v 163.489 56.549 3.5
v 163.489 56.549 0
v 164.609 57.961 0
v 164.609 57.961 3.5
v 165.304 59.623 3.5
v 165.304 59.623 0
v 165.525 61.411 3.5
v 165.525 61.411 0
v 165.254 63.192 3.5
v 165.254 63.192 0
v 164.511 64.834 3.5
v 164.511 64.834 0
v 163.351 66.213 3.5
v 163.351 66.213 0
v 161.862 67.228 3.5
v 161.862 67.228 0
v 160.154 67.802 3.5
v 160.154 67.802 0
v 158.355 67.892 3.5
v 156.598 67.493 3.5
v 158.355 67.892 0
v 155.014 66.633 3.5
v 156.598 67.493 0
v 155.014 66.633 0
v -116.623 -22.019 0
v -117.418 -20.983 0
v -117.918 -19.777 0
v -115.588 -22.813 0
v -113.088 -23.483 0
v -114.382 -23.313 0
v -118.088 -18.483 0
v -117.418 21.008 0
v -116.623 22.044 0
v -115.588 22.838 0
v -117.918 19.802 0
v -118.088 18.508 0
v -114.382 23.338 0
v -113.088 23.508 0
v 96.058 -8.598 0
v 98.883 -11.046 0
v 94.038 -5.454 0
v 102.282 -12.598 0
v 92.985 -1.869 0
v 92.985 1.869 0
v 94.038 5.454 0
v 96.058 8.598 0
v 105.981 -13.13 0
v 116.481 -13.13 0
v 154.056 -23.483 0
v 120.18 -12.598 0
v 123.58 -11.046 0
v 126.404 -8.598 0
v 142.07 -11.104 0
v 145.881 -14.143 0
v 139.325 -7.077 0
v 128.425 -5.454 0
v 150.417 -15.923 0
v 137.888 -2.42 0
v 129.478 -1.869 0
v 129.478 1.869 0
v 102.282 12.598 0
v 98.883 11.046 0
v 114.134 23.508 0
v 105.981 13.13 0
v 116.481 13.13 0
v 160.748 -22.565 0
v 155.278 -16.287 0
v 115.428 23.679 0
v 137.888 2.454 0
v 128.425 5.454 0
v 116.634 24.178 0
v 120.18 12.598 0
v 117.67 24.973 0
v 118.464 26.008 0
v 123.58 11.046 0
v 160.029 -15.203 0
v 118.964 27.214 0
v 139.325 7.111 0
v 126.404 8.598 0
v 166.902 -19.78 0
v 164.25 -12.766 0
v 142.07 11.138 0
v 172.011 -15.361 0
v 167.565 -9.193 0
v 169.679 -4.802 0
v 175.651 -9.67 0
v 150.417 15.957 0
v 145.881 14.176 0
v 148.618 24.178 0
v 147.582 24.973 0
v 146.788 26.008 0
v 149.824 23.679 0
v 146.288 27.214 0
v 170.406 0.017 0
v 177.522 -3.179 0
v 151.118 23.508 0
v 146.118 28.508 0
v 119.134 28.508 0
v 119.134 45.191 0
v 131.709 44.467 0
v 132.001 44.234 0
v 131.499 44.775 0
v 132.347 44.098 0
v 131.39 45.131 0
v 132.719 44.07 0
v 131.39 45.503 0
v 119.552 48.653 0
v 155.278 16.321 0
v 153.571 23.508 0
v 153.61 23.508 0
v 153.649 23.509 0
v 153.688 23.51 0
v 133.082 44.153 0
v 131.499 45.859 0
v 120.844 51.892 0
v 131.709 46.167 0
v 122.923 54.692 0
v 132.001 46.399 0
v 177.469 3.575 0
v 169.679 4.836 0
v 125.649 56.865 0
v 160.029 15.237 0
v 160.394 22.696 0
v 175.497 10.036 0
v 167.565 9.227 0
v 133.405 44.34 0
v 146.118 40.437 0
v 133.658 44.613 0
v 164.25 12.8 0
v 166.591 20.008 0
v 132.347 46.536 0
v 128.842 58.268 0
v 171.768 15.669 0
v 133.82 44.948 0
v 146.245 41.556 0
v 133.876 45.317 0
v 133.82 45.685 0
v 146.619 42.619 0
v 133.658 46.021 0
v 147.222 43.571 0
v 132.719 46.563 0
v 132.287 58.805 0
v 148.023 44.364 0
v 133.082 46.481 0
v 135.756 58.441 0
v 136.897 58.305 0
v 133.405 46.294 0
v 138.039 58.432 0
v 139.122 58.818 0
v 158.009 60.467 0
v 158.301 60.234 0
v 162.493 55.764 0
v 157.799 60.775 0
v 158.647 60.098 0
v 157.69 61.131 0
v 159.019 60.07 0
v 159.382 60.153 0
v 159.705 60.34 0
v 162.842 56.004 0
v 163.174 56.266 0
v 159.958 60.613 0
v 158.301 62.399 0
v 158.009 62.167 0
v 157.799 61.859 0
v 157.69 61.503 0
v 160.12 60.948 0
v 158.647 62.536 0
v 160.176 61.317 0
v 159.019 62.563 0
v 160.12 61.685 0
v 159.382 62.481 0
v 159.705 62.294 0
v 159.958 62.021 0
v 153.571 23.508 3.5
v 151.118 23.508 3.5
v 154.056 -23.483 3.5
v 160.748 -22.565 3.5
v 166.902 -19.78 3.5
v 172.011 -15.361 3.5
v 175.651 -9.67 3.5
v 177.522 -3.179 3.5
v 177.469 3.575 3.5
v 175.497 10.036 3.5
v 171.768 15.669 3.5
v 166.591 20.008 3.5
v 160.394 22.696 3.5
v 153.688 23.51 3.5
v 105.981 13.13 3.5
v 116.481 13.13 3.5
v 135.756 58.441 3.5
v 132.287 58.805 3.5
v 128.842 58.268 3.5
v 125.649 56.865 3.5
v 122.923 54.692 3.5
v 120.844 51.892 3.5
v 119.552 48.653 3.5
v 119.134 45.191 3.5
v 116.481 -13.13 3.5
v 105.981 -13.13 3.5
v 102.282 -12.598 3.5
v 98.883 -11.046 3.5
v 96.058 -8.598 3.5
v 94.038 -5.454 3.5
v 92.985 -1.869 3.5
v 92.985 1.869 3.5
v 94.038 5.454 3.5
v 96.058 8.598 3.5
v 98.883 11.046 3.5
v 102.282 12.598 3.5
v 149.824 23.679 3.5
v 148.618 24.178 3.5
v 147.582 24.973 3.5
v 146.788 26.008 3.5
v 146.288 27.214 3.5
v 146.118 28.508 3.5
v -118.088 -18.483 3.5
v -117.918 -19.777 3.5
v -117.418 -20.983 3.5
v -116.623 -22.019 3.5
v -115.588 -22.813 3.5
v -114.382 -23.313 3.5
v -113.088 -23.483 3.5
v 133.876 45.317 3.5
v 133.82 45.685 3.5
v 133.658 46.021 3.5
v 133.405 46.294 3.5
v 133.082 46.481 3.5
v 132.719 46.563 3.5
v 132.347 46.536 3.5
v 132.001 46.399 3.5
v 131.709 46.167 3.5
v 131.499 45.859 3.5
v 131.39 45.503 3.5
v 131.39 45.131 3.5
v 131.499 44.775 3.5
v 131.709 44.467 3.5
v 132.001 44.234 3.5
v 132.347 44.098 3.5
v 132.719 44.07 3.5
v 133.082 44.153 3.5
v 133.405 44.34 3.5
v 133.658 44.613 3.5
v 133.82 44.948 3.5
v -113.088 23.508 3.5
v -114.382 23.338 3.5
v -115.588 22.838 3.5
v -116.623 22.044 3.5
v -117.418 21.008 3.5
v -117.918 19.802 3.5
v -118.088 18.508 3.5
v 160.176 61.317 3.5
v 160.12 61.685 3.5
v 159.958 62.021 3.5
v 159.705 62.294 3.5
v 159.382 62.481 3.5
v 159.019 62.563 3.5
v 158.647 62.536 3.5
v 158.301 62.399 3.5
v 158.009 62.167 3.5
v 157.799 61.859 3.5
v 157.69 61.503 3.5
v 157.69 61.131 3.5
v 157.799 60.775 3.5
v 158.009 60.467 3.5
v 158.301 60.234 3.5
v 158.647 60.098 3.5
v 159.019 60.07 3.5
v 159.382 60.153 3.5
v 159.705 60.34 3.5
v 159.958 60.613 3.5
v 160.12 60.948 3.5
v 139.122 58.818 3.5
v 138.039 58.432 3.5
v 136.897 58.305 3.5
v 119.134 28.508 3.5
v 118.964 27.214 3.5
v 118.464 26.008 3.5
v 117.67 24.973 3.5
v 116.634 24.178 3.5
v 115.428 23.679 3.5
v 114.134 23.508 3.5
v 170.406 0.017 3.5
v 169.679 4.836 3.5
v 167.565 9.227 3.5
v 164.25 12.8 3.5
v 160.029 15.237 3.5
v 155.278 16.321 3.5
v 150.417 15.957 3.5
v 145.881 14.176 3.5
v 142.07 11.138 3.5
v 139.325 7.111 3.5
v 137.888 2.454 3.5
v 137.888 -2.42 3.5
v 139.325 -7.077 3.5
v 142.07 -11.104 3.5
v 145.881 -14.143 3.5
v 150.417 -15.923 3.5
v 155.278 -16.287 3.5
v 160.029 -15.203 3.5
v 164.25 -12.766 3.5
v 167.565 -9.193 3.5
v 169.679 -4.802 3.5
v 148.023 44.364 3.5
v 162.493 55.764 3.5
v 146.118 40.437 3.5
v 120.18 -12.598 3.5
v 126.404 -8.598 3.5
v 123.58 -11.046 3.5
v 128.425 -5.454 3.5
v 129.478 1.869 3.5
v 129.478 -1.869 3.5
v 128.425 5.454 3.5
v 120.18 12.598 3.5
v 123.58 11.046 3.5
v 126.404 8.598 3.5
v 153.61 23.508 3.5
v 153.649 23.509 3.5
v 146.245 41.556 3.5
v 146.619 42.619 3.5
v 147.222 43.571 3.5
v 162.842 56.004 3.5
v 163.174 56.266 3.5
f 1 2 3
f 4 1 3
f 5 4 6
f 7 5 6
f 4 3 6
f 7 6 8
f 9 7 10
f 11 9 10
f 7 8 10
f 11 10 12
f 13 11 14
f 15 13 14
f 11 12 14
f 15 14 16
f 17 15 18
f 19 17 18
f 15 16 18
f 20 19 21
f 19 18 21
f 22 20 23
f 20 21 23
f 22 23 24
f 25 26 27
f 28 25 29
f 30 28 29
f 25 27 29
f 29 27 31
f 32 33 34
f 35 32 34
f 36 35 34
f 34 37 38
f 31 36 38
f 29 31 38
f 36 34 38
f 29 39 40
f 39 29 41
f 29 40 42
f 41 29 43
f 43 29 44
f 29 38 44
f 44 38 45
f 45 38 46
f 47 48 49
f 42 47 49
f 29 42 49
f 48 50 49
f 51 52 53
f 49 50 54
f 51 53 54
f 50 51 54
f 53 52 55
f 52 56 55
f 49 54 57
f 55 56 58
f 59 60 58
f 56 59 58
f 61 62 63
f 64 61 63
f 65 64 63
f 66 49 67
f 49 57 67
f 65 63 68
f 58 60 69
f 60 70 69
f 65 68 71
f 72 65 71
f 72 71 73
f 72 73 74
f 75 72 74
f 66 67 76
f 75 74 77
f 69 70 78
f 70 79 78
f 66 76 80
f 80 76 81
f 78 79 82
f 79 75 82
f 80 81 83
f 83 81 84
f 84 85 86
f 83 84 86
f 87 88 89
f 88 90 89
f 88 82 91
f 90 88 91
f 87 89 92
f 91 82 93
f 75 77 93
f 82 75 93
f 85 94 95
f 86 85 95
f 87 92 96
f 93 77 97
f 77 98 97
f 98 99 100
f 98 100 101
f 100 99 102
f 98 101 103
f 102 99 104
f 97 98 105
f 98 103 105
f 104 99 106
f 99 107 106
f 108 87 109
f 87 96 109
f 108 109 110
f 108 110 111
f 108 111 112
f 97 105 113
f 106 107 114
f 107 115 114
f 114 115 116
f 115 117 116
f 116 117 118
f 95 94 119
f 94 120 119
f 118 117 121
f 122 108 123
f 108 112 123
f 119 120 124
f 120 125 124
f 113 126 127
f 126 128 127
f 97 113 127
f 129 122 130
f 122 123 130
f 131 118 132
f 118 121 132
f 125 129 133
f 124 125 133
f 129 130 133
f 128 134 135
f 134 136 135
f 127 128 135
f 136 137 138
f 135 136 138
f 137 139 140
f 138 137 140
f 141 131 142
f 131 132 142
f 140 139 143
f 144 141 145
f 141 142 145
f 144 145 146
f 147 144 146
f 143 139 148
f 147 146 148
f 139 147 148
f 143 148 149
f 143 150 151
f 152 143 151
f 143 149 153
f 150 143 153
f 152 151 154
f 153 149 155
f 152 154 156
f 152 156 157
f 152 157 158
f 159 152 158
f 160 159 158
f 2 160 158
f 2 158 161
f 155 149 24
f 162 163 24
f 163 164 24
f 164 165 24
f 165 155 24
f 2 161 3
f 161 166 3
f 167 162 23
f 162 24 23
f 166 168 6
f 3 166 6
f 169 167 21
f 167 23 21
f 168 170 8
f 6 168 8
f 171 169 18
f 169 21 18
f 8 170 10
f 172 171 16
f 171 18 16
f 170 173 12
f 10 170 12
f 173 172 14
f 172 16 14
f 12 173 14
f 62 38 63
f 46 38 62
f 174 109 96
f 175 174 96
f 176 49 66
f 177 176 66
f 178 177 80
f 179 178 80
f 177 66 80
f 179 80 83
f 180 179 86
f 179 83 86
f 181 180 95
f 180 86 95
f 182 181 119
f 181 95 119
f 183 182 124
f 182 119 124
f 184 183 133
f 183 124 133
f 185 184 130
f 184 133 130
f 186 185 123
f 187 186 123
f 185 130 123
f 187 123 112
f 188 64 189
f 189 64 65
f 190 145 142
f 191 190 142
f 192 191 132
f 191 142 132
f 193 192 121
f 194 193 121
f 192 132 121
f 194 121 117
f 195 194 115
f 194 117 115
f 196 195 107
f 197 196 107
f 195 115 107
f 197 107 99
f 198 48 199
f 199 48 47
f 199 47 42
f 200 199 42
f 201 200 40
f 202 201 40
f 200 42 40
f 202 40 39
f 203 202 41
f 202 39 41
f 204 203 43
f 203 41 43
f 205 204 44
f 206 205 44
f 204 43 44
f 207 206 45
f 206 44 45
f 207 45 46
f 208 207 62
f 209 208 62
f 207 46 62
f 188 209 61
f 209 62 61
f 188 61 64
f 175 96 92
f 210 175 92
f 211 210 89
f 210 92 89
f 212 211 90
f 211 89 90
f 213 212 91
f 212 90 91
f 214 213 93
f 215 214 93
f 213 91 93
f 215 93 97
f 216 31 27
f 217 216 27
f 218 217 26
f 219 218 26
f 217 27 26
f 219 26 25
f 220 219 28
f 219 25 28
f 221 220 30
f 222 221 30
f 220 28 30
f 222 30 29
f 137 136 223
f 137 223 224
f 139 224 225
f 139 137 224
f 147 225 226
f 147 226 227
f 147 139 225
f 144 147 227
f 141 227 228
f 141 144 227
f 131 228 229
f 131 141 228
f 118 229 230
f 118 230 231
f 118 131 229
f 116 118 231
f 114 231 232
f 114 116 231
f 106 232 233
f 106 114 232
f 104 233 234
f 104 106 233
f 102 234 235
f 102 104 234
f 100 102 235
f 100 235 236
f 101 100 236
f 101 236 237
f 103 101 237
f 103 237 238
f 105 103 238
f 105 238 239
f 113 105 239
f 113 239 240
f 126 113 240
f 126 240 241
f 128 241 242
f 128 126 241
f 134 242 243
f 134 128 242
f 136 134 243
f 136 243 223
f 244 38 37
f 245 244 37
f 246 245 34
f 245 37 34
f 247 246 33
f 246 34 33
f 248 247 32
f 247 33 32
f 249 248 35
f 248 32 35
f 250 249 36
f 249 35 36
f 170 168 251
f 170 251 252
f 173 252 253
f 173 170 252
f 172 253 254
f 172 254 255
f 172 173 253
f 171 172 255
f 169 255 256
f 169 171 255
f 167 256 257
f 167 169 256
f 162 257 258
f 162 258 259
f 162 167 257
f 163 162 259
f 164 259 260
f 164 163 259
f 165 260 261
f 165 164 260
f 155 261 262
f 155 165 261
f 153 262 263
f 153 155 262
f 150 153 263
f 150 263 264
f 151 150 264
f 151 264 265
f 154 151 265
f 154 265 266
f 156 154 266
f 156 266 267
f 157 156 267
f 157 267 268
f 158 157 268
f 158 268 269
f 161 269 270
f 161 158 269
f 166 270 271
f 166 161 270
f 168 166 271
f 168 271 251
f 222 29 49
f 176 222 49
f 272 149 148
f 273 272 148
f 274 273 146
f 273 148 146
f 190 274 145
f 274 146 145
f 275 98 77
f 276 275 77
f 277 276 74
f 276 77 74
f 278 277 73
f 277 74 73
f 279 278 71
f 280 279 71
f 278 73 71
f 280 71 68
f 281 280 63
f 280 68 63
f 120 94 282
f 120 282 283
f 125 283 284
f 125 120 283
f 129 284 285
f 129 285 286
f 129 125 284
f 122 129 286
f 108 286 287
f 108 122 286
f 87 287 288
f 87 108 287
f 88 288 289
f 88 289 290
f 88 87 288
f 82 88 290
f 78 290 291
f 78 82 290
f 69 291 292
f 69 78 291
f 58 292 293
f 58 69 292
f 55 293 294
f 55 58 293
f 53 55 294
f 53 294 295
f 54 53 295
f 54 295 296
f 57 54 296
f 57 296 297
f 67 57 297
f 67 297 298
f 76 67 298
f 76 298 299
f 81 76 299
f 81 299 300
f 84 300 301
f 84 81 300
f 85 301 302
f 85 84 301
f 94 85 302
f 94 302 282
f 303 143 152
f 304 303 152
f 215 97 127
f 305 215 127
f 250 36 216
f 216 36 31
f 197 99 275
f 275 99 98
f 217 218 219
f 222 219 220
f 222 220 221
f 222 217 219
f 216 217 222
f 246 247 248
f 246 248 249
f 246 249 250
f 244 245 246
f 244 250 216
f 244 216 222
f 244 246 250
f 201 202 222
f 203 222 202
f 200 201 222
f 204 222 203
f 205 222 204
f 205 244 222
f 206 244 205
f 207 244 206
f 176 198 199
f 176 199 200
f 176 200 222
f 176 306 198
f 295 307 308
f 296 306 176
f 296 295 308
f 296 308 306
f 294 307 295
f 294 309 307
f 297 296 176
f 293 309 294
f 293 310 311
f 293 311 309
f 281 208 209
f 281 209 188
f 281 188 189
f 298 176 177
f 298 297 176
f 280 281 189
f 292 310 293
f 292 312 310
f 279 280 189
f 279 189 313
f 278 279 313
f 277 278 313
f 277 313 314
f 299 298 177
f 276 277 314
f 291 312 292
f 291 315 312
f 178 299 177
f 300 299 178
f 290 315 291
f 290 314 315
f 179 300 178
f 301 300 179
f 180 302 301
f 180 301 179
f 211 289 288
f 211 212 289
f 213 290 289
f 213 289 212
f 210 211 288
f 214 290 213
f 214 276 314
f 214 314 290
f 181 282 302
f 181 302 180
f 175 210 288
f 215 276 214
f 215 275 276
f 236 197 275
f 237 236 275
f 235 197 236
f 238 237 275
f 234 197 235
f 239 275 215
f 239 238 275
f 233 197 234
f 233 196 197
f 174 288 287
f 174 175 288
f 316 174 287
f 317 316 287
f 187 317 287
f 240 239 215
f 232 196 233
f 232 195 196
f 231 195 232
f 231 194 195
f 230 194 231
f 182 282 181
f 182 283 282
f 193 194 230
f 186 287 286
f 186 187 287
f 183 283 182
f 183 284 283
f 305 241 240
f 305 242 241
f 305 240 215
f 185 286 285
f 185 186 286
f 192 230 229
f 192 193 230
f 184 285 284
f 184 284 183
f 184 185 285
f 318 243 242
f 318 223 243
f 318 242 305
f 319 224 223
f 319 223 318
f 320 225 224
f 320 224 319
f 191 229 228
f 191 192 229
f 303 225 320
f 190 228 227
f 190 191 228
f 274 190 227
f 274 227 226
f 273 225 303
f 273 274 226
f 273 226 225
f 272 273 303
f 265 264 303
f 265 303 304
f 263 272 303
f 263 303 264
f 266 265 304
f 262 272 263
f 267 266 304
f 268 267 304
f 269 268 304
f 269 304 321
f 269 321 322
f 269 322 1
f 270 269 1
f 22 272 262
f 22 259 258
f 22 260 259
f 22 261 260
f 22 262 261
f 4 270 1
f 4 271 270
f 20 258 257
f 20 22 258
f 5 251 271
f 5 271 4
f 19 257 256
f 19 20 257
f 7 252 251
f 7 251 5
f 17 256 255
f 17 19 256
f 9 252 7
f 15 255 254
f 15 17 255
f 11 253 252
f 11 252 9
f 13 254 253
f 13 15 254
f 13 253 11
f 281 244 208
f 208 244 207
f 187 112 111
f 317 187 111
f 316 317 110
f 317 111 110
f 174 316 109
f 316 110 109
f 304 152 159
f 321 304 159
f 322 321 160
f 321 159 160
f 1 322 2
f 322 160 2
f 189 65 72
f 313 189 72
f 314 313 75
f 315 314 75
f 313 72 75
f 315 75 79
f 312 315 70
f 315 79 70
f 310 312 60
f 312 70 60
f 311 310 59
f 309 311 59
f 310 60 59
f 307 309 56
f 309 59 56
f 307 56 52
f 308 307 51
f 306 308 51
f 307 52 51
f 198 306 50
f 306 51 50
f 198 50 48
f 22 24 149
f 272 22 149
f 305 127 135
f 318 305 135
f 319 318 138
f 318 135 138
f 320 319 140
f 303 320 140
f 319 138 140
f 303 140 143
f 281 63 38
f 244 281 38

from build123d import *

# Parameters (mm, degrees)
F0_R     = 16.35
F0_R_2   = 1.25
F1_DEPTH = 3.5


with BuildPart() as f1:
    # F0 (on Top) → F1 (new body)
    with BuildSketch(Plane.XY):
        with BuildLine():
            ThreePointArc((-118.087944, -18.483081), (-116.623477, -22.018615), (-113.087944, -23.483081))
            Line((-113.087944, -23.483081), (154.055671, -23.483081))
            ThreePointArc((154.055671, -23.483081), (177.739071, 0.200008), (153.688095, 23.509721))
            ThreePointArc((153.688095, 23.509721), (153.629408, 23.508687), (153.570713, 23.508343))
            Line((153.570713, 23.508343), (151.117662, 23.508343))
            ThreePointArc((151.117662, 23.508343), (147.582128, 24.972809), (146.117662, 28.508343))
            Line((146.117662, 28.508343), (146.117662, 40.43658))
            ThreePointArc((146.117662, 40.43658), (146.619244, 42.619292), (148.023355, 44.364081))
            Line((148.023355, 44.364081), (162.493134, 55.764192))
            Line((162.493134, 55.764192), (163.489272, 56.549006))
            ThreePointArc((163.489272, 56.549006), (163.978244, 65.5632), (155.014432, 66.633185))
            Line((155.014432, 66.633185), (139.121962, 58.817696))
            ThreePointArc((139.121962, 58.817696), (137.471638, 58.335528), (135.755552, 58.440901))
            ThreePointArc((135.755552, 58.440901), (124.215423, 55.867), (119.134148, 45.190849))
            Line((119.134148, 45.190849), (119.134148, 28.508343))
            ThreePointArc((119.134148, 28.508343), (117.669682, 24.972809), (114.134148, 23.508343))
            Line((114.134148, 23.508343), (-113.087944, 23.508343))
            ThreePointArc((-113.087944, 23.508343), (-116.623477, 22.043877), (-118.087944, 18.508343))
            Line((-118.087944, 18.508343), (-118.087944, -18.483081))
        make_face()
        with BuildLine():
            ThreePointArc((105.981351, -13.13), (92.851351, 0), (105.981351, 13.13))
            Line((105.981351, 13.13), (116.481351, 13.13))
            ThreePointArc((116.481351, 13.13), (129.611351, 0), (116.481351, -13.13))
            Line((116.481351, -13.13), (105.981351, -13.13))
        make_face(mode=Mode.SUBTRACT)
        with Locations((154.055671, 0.016919)):
            Circle(F0_R, mode=Mode.SUBTRACT)
        with Locations((132.625611, 45.316919)):
            Circle(F0_R_2, mode=Mode.SUBTRACT)
        with Locations((158.925611, 61.316919)):
            Circle(F0_R_2, mode=Mode.SUBTRACT)
        with BuildLine():
            Line((163.489272, 56.549006), (162.493134, 55.764192))
            ThreePointArc((162.493134, 55.764192), (163.010096, 56.132618), (163.489272, 56.549006))
        make_face()
    extrude(amount=F1_DEPTH)


solid = f1.part
